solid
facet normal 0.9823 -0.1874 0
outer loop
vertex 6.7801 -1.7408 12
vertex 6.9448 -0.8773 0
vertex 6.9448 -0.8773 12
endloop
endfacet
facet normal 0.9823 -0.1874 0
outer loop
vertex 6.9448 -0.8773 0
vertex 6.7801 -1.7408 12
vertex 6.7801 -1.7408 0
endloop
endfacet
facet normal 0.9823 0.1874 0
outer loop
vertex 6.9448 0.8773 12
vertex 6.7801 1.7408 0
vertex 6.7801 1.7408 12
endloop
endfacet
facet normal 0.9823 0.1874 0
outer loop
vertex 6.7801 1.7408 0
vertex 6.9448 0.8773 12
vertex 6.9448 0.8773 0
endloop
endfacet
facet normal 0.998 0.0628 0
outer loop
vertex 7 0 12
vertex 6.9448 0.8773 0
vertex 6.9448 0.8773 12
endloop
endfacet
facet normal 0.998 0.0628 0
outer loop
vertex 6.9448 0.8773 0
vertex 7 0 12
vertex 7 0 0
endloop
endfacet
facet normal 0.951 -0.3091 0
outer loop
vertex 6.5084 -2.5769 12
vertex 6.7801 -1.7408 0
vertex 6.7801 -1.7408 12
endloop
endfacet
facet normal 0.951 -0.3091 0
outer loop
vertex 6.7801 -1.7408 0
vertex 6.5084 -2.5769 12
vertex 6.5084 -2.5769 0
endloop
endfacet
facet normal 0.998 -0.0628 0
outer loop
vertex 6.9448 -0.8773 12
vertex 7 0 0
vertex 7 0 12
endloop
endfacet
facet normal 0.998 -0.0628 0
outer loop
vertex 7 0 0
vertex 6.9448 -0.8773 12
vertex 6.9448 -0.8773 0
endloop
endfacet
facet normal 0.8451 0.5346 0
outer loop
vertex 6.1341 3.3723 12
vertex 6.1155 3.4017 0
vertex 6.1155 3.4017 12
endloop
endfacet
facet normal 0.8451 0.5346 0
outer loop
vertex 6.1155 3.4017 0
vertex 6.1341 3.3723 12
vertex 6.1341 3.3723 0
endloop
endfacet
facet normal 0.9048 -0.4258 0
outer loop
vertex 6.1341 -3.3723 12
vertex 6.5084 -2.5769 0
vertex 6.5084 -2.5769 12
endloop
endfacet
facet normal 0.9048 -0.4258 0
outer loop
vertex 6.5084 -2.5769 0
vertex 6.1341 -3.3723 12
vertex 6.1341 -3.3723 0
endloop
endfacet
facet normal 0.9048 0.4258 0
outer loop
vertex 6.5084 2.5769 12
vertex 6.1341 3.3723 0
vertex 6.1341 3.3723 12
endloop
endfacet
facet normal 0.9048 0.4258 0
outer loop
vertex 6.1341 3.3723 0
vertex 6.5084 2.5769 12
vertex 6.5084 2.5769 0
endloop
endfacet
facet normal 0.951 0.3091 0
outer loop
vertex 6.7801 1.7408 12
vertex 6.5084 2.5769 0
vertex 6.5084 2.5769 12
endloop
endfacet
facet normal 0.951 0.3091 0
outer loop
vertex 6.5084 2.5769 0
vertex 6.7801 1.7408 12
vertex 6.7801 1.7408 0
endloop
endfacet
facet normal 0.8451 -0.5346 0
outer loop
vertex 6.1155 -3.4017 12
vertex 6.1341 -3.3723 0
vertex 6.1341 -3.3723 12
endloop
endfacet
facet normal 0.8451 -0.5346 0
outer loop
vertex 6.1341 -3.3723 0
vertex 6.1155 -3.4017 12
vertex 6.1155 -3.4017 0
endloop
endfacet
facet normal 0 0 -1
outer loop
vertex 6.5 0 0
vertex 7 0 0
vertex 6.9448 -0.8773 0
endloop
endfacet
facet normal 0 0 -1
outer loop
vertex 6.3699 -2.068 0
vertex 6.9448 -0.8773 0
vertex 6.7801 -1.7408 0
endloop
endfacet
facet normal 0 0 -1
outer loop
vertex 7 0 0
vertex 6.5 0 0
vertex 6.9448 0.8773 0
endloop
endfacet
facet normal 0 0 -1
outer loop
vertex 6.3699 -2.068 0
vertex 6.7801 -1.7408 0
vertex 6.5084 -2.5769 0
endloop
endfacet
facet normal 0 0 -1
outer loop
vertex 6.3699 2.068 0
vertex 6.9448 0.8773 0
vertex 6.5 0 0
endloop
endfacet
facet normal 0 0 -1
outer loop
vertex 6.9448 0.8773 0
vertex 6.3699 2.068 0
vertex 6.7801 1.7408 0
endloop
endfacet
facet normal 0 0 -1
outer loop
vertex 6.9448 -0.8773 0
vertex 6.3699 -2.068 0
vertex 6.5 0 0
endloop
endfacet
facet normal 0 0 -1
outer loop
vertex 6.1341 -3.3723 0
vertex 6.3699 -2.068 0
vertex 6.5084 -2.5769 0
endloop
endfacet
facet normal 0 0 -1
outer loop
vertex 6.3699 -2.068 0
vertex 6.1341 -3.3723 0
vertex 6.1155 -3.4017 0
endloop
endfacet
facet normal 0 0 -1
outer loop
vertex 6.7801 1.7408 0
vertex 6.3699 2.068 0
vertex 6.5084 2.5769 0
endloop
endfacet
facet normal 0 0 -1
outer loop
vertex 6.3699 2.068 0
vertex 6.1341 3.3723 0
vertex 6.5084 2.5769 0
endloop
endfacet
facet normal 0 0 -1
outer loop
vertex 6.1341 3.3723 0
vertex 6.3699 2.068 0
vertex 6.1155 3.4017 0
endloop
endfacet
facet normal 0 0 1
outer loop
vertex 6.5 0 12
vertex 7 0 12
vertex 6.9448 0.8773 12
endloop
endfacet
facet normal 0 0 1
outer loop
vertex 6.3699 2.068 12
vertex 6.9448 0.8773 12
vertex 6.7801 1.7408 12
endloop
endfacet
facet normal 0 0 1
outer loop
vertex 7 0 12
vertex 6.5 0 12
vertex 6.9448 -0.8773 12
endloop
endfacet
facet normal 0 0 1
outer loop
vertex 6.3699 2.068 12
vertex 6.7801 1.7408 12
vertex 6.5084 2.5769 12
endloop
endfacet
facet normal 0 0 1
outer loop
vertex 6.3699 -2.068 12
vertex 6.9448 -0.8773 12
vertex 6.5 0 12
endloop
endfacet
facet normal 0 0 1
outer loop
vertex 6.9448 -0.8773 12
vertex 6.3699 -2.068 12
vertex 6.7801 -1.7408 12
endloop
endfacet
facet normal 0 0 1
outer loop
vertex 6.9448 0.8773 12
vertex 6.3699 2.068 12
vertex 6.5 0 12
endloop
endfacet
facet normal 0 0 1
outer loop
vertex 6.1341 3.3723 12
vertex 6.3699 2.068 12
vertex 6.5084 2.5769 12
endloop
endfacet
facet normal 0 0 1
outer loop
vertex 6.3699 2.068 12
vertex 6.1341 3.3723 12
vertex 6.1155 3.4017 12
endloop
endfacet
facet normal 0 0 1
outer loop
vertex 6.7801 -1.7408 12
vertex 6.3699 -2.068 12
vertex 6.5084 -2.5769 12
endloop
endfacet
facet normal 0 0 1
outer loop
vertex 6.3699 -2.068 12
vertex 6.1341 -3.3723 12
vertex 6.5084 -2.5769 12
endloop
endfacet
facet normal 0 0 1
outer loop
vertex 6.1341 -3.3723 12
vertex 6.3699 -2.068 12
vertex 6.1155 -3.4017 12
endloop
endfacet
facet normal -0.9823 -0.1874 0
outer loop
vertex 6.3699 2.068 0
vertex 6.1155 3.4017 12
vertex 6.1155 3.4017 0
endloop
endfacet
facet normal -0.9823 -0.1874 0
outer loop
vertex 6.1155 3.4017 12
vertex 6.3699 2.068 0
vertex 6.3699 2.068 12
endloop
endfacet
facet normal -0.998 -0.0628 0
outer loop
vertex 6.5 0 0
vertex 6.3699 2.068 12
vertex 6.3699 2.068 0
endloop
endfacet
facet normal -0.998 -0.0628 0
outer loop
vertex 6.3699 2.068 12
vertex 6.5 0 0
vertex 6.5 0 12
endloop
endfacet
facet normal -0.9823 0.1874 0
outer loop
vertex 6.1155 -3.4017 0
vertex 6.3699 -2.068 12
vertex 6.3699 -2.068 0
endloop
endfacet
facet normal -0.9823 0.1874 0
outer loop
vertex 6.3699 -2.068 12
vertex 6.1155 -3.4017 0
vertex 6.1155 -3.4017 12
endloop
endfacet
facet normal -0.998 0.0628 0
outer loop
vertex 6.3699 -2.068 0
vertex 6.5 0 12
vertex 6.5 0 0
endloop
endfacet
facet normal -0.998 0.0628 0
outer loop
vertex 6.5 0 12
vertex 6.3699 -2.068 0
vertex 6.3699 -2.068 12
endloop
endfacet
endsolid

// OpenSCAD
$fn = 50;


difference() {
	union() {
		cylinder(h = 12, r = 7.0000000000);
		translate(v = [-13.0000000000, 0, 0]) {
			cylinder(h = 12, r = 7.0000000000);
		}
	}
	union() {
		cylinder(h = 12, r = 3.2500000000);
		cylinder(h = 12, r = 1.8000000000);
		cylinder(h = 12, r = 1.8000000000);
		cylinder(h = 12, r = 1.8000000000);
		translate(v = [-17.5000000000, 0, 0]) {
			hull() {
				translate(v = [-3.7500000000, 0.0000000000, 0]) {
					cylinder(h = 12, r = 7.5000000000);
				}
				translate(v = [3.7500000000, 0.0000000000, 0]) {
					cylinder(h = 12, r = 7.5000000000);
				}
				translate(v = [-3.7500000000, -0.0000000000, 0]) {
					cylinder(h = 12, r = 7.5000000000);
				}
				translate(v = [3.7500000000, -0.0000000000, 0]) {
					cylinder(h = 12, r = 7.5000000000);
				}
			}
		}
		translate(v = [-10.0000000000, 0, 0.0000000000]) {
			cylinder(h = 12, r = 16.5000000000);
		}
	}
}
